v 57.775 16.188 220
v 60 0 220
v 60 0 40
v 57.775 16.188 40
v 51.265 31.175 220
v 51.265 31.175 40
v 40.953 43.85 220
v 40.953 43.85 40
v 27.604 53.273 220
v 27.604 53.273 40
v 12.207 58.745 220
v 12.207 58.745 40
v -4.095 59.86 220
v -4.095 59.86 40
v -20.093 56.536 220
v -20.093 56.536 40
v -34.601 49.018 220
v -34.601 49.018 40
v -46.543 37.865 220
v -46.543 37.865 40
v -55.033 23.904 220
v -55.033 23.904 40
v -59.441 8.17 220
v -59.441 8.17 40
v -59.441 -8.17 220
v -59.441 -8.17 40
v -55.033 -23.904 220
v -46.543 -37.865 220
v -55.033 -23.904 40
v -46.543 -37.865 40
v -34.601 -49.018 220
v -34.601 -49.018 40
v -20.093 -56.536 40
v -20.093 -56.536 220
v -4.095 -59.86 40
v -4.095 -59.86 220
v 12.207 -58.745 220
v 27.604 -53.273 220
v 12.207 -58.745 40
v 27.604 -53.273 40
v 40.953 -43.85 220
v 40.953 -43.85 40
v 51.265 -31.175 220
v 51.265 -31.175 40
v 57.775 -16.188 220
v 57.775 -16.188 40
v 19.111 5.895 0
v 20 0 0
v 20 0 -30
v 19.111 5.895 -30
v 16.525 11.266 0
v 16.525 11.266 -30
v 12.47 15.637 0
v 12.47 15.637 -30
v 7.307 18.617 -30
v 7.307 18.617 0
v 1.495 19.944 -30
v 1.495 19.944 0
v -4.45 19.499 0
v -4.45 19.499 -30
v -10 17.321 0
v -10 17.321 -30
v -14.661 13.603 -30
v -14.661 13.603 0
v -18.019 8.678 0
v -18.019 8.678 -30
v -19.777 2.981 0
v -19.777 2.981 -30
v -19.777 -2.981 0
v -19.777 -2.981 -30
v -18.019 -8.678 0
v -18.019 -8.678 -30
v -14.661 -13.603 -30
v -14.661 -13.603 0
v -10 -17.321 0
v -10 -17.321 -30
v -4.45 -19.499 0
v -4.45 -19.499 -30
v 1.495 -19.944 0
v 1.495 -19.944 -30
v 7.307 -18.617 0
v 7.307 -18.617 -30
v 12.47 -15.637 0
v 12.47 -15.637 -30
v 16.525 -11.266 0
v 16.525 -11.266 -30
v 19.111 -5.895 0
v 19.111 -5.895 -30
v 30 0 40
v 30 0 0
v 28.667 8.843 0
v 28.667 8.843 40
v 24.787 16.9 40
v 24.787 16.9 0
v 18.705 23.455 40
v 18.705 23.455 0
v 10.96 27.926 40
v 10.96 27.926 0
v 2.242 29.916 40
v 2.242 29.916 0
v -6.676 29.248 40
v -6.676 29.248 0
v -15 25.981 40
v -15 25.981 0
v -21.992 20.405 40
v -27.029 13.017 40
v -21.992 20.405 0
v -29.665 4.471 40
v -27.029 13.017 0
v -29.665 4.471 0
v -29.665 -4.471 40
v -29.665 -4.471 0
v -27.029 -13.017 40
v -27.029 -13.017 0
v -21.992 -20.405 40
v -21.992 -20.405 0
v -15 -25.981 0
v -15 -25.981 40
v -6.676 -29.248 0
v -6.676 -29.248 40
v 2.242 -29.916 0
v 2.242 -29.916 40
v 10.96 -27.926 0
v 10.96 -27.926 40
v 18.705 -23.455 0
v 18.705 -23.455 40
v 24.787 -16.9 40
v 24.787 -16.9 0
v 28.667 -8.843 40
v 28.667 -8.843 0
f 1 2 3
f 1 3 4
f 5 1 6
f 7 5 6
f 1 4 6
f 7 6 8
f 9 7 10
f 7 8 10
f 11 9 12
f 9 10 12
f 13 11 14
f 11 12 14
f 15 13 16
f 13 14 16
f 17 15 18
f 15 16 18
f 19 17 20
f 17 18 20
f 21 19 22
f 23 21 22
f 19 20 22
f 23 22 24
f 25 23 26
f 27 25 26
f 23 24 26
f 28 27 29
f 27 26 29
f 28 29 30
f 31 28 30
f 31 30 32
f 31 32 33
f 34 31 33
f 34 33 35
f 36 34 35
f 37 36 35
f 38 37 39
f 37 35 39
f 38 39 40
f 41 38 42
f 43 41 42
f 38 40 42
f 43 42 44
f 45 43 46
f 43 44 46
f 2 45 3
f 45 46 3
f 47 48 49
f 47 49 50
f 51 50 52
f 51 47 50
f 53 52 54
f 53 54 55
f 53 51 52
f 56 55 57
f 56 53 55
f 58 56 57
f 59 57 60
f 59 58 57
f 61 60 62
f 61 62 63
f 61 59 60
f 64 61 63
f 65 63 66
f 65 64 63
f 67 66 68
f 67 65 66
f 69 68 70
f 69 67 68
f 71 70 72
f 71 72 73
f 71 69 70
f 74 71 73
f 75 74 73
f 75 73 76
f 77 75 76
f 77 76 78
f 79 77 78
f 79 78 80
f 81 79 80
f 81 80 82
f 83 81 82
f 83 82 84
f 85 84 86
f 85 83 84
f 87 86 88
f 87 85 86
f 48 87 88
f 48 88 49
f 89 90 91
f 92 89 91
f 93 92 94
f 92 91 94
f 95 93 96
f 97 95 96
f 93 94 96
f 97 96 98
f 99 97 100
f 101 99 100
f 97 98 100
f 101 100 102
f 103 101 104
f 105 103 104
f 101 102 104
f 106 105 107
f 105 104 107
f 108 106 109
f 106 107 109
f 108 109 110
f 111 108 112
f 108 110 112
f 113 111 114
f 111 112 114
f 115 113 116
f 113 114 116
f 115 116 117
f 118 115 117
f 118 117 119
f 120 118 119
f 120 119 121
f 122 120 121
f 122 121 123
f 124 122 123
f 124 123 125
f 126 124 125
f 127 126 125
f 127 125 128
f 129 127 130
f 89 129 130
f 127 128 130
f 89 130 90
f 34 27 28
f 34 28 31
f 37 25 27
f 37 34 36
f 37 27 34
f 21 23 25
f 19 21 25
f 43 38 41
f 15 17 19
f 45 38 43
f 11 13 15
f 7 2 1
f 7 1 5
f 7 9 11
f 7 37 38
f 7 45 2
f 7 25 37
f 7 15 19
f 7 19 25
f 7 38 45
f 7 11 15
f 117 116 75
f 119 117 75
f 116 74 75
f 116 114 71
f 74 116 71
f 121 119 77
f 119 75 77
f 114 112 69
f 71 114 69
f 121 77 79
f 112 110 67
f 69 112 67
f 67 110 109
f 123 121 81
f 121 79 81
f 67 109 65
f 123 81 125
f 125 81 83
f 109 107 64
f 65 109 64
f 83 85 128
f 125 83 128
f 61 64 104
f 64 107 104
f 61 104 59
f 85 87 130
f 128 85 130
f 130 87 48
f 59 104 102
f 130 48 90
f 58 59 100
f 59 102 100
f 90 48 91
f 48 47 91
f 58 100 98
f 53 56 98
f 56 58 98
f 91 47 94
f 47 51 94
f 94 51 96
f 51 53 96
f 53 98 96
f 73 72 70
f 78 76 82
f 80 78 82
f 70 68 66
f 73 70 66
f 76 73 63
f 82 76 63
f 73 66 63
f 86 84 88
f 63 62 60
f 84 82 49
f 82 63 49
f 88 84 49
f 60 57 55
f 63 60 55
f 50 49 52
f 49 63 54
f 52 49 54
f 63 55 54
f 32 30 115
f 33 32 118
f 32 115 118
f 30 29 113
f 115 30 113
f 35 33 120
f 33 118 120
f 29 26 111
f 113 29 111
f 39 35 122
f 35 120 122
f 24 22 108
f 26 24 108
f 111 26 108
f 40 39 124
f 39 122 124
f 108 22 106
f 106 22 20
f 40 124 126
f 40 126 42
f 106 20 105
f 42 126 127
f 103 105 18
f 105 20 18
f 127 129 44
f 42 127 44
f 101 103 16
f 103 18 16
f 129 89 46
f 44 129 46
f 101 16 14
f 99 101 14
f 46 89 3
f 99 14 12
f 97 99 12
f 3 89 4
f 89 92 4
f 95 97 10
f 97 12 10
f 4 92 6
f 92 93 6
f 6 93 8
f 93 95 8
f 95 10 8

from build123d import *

# Parameters (mm, degrees)
F0_R     = 20
F1_DEPTH = 30
F2_R     = 30
F3_DEPTH = 40
F4_R     = 60
F5_DEPTH = 180


with BuildPart() as f1:
    # F0 (on Top) → F1 (new body)
    with BuildSketch(Plane.XY):
        Circle(F0_R)
    extrude(amount=-F1_DEPTH)

    # F2 (on Top) → F3 (join)
    with BuildSketch(Plane.XY):
        Circle(F2_R)
    extrude(amount=F3_DEPTH)

    # F4 (on face) → F5 (join)
    with BuildSketch(Plane.XY.offset(40)):
        Circle(F4_R)
    extrude(amount=F5_DEPTH)


solid = f1.part
